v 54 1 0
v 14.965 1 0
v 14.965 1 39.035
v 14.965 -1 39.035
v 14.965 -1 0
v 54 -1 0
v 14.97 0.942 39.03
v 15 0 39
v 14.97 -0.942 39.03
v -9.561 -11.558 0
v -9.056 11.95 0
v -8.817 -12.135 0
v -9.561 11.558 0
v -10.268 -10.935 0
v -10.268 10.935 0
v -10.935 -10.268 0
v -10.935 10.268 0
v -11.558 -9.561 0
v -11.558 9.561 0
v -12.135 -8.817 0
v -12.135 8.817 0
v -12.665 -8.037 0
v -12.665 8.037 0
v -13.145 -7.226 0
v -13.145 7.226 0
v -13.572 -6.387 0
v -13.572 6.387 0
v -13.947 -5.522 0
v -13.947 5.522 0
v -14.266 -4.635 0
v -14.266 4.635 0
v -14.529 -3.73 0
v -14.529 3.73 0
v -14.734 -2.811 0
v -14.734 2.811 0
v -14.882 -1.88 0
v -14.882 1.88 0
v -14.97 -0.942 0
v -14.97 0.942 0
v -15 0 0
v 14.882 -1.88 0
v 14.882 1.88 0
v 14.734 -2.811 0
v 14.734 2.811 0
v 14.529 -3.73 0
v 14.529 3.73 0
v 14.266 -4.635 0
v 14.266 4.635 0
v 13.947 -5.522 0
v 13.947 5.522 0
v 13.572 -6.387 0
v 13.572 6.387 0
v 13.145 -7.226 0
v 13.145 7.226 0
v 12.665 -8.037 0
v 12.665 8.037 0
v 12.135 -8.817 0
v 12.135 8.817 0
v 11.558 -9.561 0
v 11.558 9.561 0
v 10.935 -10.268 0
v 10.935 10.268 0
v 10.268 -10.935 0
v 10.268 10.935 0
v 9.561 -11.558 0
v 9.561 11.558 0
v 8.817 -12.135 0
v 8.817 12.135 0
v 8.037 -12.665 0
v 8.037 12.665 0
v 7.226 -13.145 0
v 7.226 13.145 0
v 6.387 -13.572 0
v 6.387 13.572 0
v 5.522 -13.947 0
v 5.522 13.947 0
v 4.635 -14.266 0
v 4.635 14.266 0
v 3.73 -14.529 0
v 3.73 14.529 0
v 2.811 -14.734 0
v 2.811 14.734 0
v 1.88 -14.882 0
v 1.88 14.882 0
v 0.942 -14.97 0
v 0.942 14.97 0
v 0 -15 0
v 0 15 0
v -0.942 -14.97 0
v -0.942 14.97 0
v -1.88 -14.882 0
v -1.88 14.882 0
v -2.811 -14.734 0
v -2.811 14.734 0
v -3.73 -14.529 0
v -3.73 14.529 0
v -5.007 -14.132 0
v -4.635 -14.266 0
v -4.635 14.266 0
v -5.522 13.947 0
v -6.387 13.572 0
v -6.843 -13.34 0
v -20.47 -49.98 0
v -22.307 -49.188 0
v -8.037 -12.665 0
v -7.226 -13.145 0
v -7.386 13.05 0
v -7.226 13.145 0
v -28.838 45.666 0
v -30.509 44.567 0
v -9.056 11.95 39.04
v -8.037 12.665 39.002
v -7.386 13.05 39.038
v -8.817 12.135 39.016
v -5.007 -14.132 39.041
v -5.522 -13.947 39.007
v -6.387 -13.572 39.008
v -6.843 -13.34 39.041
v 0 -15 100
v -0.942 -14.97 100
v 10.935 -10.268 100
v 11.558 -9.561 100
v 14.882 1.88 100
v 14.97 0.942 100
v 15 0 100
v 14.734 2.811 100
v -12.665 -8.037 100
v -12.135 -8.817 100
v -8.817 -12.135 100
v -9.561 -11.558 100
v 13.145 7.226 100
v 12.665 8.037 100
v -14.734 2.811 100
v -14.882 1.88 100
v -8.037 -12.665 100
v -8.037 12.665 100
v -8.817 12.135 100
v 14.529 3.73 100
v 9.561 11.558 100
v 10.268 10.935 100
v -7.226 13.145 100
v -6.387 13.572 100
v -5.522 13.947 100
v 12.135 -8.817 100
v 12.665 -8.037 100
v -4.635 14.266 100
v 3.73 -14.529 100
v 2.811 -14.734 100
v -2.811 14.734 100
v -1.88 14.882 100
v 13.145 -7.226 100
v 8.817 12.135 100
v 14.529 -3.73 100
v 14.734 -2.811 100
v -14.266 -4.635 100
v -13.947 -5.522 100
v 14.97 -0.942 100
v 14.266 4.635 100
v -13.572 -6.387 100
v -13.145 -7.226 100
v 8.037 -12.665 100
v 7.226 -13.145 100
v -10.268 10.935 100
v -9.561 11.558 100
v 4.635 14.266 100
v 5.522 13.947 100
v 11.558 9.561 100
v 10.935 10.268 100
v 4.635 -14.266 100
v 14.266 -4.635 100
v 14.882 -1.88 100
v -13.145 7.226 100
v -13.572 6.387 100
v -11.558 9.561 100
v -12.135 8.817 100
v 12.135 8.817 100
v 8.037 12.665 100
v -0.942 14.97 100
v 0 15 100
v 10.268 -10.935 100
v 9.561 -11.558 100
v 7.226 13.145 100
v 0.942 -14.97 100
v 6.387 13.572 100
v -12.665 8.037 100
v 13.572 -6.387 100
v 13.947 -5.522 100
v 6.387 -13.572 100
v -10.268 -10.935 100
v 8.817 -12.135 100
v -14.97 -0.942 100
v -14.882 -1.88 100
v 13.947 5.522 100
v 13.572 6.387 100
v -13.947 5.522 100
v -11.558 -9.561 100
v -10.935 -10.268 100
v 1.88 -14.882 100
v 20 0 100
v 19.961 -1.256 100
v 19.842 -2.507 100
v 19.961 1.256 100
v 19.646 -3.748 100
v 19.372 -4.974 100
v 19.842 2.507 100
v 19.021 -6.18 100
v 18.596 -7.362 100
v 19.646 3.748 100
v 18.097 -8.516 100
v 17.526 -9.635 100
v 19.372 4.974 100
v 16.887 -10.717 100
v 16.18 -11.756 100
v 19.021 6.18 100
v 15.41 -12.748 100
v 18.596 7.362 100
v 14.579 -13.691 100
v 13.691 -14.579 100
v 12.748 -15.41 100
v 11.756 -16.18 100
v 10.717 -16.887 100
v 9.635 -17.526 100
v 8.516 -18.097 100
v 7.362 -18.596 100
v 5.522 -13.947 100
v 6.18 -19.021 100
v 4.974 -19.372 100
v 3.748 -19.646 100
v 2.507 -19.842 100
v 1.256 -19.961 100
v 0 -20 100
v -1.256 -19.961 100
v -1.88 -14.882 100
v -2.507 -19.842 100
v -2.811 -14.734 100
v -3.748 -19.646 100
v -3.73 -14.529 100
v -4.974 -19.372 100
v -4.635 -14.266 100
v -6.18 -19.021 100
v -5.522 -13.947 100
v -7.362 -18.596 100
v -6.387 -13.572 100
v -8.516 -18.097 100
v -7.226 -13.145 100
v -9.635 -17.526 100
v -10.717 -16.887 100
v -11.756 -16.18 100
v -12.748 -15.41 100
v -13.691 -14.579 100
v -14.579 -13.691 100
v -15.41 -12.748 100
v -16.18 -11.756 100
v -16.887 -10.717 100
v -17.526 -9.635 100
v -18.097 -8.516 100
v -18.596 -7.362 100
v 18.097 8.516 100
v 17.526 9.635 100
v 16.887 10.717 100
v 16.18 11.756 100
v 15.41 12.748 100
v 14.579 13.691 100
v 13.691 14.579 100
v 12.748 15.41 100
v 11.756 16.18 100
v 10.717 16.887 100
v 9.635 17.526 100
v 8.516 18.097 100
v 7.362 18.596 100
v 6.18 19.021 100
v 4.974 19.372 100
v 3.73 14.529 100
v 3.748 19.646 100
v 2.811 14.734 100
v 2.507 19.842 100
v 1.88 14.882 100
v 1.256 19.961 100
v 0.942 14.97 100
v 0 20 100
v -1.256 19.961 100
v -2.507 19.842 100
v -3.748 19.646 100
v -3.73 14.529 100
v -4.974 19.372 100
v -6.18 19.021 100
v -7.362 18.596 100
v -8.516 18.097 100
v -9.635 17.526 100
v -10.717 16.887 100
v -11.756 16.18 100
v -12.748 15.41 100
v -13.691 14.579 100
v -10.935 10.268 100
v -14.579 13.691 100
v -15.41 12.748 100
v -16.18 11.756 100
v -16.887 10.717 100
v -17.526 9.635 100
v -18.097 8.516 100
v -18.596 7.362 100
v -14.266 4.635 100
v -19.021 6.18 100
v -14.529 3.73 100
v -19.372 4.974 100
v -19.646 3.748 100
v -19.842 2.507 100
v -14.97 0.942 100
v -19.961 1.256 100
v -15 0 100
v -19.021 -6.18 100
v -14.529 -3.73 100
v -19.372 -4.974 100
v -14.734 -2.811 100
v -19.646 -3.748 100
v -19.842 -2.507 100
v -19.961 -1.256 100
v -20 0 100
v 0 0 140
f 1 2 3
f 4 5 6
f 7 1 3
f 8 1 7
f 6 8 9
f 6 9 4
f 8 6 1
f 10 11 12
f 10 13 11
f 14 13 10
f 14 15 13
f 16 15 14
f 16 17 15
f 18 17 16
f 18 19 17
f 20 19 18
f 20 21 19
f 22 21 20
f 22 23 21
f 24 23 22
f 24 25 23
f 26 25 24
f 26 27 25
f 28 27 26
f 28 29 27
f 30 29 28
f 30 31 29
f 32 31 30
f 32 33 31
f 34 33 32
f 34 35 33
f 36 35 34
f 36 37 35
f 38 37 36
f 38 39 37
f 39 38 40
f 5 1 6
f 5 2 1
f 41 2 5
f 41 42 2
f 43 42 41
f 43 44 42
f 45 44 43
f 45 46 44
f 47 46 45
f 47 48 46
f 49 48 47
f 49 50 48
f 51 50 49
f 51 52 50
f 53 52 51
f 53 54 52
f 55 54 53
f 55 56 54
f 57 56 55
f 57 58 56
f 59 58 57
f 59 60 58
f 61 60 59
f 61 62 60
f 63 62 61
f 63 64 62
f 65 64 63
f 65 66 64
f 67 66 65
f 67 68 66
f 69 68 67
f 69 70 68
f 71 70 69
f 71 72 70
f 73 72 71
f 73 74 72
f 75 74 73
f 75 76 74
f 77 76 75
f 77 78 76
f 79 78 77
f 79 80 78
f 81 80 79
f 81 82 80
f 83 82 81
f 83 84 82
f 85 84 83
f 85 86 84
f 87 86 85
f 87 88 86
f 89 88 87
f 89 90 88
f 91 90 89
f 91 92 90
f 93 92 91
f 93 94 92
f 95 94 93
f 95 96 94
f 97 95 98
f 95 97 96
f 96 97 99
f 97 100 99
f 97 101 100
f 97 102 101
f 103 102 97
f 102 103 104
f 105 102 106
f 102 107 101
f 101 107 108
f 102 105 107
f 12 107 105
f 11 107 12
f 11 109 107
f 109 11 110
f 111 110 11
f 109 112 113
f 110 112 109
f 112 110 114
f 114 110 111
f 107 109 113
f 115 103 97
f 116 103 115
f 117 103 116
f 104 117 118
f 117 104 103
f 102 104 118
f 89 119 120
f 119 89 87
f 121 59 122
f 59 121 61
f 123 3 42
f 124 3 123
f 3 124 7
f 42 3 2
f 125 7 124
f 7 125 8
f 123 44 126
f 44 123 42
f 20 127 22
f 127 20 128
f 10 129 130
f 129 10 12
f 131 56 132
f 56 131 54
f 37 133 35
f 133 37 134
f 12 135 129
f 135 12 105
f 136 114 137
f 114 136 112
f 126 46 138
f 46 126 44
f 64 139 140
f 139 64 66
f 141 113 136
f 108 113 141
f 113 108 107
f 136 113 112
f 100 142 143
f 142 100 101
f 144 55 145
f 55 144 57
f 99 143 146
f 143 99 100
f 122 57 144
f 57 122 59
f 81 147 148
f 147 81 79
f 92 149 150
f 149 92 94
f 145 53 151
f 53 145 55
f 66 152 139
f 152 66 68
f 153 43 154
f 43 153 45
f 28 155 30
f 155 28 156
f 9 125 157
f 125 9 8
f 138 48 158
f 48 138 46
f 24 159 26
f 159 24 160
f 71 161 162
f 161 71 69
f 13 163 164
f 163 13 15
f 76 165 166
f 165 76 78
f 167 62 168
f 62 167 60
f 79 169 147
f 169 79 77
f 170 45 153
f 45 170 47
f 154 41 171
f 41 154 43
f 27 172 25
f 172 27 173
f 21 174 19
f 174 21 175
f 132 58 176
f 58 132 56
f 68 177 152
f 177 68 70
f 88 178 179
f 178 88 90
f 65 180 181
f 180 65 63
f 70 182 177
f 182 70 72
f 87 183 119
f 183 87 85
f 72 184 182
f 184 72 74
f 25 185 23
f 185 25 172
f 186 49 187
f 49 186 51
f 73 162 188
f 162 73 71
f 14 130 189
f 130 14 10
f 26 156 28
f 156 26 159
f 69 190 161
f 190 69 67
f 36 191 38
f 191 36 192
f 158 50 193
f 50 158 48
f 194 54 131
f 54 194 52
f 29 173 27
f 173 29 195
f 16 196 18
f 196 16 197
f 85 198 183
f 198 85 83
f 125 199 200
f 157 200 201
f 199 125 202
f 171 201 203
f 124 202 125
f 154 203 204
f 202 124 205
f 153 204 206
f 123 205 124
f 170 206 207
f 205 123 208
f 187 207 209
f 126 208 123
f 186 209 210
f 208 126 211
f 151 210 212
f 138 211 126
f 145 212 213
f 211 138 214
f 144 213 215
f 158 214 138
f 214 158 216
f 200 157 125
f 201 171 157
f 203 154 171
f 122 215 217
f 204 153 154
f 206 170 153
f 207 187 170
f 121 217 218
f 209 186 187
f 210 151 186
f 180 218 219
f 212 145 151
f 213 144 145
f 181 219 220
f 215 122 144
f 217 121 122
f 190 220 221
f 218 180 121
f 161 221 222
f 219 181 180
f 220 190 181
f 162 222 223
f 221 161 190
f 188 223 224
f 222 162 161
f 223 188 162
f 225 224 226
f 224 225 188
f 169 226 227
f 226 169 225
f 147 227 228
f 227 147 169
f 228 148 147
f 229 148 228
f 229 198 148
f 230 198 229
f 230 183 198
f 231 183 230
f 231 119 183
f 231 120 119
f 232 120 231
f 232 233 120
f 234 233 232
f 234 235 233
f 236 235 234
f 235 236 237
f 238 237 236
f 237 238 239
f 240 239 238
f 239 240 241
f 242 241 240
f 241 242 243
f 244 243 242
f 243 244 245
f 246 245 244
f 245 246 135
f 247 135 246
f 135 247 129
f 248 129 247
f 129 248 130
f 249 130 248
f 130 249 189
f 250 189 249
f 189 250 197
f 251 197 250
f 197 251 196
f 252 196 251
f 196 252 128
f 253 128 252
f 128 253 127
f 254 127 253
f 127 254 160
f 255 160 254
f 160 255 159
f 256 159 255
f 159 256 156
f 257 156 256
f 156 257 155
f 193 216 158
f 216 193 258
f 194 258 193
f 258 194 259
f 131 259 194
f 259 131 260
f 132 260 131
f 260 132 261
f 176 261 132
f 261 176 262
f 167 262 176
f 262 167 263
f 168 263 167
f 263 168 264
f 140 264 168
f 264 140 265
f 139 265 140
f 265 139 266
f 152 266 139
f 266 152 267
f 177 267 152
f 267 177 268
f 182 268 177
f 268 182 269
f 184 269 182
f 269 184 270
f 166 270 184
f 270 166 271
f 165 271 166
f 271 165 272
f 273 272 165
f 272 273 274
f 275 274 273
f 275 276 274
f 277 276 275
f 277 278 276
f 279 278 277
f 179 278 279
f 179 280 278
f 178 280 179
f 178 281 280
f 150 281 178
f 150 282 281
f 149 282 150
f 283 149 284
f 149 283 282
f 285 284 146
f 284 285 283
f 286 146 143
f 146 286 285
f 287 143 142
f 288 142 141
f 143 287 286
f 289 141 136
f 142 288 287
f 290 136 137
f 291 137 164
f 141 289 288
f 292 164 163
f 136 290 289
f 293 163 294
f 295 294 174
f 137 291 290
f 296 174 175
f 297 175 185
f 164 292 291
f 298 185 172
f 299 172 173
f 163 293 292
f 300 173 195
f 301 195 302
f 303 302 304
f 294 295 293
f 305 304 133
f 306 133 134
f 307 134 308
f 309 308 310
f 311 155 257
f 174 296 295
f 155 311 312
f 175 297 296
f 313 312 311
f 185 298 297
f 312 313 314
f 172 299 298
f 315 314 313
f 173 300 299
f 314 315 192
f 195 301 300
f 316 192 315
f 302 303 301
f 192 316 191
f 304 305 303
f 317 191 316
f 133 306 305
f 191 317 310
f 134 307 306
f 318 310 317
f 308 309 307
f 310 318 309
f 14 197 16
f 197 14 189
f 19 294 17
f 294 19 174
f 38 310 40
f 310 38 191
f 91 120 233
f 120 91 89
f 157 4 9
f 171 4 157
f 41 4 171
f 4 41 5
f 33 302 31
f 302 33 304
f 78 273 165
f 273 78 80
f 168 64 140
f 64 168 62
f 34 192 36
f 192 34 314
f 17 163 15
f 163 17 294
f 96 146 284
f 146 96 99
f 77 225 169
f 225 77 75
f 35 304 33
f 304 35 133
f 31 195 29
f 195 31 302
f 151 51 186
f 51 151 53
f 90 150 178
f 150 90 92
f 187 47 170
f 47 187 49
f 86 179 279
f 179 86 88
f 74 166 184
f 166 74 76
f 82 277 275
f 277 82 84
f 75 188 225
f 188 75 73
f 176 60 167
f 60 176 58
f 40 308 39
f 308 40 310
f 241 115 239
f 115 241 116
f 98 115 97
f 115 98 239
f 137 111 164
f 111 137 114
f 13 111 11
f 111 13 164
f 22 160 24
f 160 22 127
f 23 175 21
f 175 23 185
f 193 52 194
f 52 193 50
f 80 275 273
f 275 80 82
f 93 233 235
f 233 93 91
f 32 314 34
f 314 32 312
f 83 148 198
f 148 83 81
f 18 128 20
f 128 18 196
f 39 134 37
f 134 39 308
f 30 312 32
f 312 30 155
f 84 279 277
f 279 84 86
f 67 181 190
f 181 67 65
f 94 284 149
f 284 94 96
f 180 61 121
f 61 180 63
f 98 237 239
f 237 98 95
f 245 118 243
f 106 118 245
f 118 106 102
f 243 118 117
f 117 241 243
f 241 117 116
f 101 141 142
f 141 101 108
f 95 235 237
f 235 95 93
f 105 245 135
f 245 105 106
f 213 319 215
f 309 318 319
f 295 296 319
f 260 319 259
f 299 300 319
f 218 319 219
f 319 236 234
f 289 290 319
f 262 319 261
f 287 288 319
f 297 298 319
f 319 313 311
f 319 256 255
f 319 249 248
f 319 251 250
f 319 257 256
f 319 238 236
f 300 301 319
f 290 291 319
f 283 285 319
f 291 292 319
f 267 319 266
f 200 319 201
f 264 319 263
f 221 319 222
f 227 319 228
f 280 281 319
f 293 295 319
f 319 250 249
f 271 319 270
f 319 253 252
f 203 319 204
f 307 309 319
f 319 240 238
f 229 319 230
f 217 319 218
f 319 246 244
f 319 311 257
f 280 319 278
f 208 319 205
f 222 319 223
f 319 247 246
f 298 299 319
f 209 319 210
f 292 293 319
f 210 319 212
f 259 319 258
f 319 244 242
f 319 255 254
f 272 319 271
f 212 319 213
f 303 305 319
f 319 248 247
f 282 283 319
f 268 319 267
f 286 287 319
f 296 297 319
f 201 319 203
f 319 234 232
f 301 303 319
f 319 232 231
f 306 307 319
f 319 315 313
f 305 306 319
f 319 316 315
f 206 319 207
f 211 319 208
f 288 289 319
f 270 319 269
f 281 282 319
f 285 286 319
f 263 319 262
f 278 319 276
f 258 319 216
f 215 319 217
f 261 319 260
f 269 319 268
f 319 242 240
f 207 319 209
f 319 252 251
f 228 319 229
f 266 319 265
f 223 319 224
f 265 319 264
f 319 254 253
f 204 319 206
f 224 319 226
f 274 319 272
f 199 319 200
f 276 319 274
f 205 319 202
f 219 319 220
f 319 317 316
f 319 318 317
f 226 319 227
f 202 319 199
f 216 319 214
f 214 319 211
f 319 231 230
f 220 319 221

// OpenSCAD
// Retrieved from: https://en.wikibooks.org/wiki/OpenSCAD_User_Manual/Commented_Example_Projects
// (formatting normalized: tabs → spaces)

// increase the visual detail
$fn = 100;

// the main body :
// a cylinder
rocket_d = 30;                 // 3 cm wide
rocket_r = rocket_d / 2;
rocket_h = 100;             // 10 cm tall
cylinder(d = rocket_d, h = rocket_h);

// the head :
// a cone
head_d = 40;                  // 4 cm wide
head_r = head_d / 2;
head_h = 40;                  // 4 cm tall
// prepare a triangle
tri_base = head_r;
tri_height = head_h;
tri_points = [[0,             0],
              [tri_base,     0],
              [0,    tri_height]];
// rotation around X-axis and then 360° around Z-axis
// put it on top of the rocket's body
translate([0,0,rocket_h])
rotate_extrude(angle = 360)
    polygon(tri_points);

// the wings :
// 3x triangles
wing_w = 2;                    // 2 mm thick
many = 3;                    // 3x wings
wing_l = 40;                // length
wing_h = 40;                // height
wing_points = [[0,0],[wing_l,0],[0,wing_h]];

module wing() {
    // let it a bit inside the main body
    in_by = 1;                // 1 mm
    // set it up on the rocket's perimeter
    translate([rocket_r - in_by,0,0])
    // set it upright by rotating around X-axis
    rotate([90,0,0])
    // set some width and center it
    linear_extrude(height = wing_w,center = true)
    // make a triangle
        polygon(wing_points);
}

for (i = [0: many - 1])
    rotate([0, 0, 370 / many * i])
    wing();
